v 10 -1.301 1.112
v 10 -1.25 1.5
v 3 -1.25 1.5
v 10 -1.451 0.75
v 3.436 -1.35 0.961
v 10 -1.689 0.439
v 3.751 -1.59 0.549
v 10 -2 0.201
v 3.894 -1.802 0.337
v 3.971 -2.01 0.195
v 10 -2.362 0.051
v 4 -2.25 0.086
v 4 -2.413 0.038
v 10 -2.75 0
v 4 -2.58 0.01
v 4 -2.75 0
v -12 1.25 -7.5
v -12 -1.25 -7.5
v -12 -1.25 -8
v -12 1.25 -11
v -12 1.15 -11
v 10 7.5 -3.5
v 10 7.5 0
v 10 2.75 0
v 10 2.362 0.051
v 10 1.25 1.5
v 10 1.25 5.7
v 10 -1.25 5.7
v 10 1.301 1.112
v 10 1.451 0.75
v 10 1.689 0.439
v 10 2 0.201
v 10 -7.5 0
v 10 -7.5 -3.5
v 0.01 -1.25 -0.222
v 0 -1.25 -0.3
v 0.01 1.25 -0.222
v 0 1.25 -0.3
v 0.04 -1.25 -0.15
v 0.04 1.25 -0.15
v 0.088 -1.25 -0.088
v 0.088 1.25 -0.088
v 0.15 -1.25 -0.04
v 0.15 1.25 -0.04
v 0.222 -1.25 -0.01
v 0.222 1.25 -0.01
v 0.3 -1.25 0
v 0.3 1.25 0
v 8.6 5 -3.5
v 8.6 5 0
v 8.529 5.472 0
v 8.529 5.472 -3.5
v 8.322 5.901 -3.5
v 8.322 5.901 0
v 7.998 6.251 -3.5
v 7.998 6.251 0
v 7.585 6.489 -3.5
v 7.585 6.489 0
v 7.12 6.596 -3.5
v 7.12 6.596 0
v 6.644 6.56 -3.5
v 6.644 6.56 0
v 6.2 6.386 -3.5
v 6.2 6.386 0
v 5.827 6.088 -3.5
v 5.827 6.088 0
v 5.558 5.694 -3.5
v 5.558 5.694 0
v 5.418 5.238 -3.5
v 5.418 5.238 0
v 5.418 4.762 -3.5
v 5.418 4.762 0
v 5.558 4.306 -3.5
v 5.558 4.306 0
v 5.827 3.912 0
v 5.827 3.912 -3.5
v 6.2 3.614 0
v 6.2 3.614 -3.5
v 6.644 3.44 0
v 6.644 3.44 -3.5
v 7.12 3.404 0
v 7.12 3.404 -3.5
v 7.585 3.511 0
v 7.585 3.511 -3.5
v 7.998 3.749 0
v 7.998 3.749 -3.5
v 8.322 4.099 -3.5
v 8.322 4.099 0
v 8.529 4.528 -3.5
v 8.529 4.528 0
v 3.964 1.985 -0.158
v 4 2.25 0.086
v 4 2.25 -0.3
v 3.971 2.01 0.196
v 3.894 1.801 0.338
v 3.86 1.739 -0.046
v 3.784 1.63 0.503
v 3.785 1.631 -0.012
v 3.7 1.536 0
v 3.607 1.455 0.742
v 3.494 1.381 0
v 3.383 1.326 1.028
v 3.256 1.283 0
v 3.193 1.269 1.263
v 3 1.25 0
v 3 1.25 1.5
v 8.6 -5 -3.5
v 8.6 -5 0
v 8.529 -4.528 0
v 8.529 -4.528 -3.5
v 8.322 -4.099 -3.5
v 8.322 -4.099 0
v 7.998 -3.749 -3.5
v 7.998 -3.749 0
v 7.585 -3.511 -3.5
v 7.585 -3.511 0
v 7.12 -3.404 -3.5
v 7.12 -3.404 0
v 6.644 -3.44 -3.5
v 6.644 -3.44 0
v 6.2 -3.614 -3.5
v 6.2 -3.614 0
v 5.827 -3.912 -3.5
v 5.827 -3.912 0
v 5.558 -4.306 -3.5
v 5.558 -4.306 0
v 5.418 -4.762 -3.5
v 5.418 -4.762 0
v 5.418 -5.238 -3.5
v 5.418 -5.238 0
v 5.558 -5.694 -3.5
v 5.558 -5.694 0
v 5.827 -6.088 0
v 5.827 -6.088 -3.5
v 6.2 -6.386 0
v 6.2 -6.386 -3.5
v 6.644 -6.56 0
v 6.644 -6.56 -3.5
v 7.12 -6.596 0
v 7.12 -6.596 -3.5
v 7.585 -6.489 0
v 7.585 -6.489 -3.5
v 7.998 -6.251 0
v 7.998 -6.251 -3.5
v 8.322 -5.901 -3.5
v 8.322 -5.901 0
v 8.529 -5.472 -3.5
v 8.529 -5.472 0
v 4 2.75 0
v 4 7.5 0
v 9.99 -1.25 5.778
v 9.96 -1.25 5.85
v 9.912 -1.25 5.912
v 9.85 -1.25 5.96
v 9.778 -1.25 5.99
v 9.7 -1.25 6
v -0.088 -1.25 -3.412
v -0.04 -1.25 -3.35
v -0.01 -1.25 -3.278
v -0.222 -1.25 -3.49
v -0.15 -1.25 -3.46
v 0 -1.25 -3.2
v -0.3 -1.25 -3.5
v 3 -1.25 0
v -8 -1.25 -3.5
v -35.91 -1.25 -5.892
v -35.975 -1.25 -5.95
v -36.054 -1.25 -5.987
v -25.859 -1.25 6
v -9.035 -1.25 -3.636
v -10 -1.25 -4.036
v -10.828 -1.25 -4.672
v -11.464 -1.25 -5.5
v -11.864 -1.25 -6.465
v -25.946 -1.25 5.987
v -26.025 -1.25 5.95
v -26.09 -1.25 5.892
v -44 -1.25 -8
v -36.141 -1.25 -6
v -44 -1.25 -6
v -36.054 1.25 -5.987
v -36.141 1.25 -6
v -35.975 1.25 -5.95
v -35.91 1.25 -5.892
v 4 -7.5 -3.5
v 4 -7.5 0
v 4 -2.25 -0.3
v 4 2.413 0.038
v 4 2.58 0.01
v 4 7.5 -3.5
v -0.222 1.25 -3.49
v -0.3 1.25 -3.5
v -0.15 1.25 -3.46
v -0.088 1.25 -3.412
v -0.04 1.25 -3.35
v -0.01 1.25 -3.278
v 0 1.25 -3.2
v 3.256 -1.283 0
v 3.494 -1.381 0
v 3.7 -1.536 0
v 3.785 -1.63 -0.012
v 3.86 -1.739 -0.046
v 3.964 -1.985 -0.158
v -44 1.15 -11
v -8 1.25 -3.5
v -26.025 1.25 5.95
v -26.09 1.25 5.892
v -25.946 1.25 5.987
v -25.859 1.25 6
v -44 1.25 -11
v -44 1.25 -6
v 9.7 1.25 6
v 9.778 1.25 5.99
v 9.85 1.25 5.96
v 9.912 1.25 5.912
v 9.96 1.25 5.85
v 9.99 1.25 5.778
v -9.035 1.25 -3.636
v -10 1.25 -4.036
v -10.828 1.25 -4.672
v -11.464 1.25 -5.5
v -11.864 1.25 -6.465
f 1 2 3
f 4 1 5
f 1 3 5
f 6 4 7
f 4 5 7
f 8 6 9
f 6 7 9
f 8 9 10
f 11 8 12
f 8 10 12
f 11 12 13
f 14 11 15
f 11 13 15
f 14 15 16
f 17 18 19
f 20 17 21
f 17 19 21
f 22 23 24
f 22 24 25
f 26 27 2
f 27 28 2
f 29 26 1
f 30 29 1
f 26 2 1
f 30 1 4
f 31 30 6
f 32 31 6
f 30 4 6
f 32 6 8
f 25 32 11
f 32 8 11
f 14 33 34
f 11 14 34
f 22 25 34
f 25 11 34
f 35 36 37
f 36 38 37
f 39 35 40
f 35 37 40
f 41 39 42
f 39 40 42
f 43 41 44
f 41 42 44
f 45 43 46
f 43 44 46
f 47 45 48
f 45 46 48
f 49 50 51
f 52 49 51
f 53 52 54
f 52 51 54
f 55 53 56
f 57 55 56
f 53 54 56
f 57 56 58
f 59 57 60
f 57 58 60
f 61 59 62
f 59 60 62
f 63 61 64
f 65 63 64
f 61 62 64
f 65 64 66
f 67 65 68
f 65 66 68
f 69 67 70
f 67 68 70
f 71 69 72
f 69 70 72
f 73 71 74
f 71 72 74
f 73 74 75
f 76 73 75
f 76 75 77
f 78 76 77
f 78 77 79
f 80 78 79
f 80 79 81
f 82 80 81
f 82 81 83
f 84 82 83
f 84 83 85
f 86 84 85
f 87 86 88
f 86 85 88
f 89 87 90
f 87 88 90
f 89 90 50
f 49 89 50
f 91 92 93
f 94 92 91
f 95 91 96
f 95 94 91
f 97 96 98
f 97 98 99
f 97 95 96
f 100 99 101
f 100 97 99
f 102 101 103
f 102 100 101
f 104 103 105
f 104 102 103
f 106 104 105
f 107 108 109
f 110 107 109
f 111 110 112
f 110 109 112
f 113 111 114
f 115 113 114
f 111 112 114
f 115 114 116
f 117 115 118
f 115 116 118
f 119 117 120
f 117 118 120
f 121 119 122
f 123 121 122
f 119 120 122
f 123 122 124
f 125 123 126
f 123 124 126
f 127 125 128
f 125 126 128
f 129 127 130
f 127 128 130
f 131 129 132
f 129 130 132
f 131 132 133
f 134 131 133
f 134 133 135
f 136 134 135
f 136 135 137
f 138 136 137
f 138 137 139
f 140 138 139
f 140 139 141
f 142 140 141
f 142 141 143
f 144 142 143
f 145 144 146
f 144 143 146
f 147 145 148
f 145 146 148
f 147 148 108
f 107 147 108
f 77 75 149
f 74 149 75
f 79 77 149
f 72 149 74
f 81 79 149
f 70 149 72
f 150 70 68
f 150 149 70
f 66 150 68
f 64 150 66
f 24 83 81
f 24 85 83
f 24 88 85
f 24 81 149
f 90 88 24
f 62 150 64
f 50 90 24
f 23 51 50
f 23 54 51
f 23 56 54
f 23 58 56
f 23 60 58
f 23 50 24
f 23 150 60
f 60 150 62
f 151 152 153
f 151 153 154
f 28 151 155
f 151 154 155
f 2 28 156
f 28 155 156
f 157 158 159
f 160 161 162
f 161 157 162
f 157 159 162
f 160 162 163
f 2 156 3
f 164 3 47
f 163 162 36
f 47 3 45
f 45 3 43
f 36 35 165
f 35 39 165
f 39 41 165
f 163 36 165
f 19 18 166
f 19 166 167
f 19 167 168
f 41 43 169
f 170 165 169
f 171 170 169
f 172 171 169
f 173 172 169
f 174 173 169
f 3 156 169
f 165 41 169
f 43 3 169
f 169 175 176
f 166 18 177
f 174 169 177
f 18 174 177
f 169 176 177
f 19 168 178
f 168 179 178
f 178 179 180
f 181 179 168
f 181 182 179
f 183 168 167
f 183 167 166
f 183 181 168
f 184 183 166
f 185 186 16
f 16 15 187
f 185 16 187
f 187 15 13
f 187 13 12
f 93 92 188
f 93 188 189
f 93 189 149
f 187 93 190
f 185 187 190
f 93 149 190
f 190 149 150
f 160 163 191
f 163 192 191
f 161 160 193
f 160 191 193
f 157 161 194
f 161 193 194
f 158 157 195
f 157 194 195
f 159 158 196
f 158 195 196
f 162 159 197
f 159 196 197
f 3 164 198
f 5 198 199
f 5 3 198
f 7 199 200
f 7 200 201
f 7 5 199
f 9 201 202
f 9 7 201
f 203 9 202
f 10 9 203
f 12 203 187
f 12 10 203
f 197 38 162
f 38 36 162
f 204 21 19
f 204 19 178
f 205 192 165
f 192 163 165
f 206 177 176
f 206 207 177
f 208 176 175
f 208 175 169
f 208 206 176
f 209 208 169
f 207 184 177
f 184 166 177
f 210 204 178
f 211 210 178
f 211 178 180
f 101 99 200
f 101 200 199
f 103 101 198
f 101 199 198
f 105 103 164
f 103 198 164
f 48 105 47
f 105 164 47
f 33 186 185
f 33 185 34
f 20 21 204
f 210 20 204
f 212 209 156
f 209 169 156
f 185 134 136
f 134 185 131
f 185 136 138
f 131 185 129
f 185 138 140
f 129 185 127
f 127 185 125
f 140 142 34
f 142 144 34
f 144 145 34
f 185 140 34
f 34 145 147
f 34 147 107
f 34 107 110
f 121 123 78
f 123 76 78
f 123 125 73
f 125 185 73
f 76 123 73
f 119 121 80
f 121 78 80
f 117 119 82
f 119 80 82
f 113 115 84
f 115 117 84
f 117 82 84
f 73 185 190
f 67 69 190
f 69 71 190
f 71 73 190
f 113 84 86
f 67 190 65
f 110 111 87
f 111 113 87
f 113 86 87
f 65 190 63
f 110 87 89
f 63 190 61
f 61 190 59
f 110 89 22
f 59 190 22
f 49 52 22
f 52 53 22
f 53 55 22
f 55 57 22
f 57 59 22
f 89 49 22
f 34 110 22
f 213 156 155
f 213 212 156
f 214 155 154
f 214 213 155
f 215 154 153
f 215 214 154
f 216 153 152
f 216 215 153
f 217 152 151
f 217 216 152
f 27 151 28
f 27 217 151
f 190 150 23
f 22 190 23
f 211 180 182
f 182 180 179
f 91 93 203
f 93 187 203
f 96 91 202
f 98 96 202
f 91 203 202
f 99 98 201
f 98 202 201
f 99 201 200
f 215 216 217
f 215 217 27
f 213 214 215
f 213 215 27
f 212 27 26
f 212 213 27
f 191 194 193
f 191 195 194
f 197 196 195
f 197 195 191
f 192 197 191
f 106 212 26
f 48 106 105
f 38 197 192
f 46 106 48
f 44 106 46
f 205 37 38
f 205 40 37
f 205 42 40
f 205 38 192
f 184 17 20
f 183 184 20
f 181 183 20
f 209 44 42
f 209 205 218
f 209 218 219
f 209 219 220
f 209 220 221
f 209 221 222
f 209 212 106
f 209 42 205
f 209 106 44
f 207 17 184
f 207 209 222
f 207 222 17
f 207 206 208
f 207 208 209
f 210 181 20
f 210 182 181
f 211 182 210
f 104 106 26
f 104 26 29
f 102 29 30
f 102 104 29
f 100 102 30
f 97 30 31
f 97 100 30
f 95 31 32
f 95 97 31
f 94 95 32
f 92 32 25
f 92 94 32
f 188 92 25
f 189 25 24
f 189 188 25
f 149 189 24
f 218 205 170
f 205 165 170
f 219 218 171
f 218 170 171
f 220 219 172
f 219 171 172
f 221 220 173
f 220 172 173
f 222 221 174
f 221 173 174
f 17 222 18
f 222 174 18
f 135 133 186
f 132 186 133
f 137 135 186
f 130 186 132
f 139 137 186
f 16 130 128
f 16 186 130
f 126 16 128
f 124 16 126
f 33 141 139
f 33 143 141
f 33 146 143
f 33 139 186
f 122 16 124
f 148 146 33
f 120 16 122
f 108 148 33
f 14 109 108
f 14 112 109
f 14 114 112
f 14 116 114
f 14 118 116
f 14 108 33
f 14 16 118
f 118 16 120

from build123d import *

# Parameters (mm, degrees)
SKETCH_W          = 6
SKETCH_H          = 15
SKETCH_R          = 1.6
PAD_DEPTH         = 3.5
PAD001_DEPTH      = 1.25
PAD001_DEPTH_BACK = 1.25
CHAMFER_SIZE2     = 2.4
CHAMFER_SIZE      = 3
FILLET_R          = 0.3
FILLET001_R       = 1.5
FILLET002_R       = 1
FILLET003_R       = 0.3


with BuildPart() as part:
    # Sketch (on XY_Plane of Origin) → Pad (new body)
    with BuildSketch(Plane.XY):
        with Locations((7, 0)):
            Rectangle(SKETCH_W, SKETCH_H)
        with Locations((7, 5)):
            Circle(SKETCH_R, mode=Mode.SUBTRACT)
        with Locations((7, -5)):
            Circle(SKETCH_R, mode=Mode.SUBTRACT)
    extrude(amount=-PAD_DEPTH)

    # Sketch003 → Pad001 (join, two sides)
    with BuildSketch(Plane.XZ) as pad001_sk:
        with BuildLine():
            Line((10, 0), (0, 0))
            Line((0, 0), (0, -3.5))
            Line((0, -3.5), (-8, -3.5))
            ThreePointArc((-8, -3.5), (-10.828427, -4.671573), (-12, -7.5))
            Line((-12, -7.5), (-12, -11))
            Line((-12, -11), (-44, -11))
            Line((-44, -11), (-44, -6))
            Line((-44, -6), (-36, -6))
            Line((-36, -6), (-26, 6))
            Line((-26, 6), (10, 6))
            Line((10, 6), (10, 0))
        make_face()
    extrude(amount=PAD001_DEPTH)
    extrude(pad001_sk.sketch, amount=-PAD001_DEPTH_BACK)

    # Chamfer
    chamfer_edges = [part.edges().sort_by_distance(p)[0] for p in [
        (-28, -1.25, -11),
    ]]
    chamfer_side = part.faces().sort_by_distance((-17.427573, -1.25, -2.073781))[0]
    chamfer(chamfer_edges, length=CHAMFER_SIZE, length2=CHAMFER_SIZE2, reference=chamfer_side)

    # Fillet
    fillet_edges = [part.edges().sort_by_distance(p)[0] for p in [
        (-36, 0, -6),
        (-26, 0, 6),
        (0, 0, -3.5),
        (10, 0, 6),
        (0, 0, 0),
    ]]
    fillet(fillet_edges, radius=FILLET_R)

    # Fillet001
    fillet001_edges = [part.edges().sort_by_distance(p)[0] for p in [
        (7, 1.25, 0),
        (7, -1.25, 0),
    ]]
    fillet(fillet001_edges, radius=FILLET001_R)

    # Fillet002
    fillet002_edges = [part.edges().sort_by_distance(p)[0] for p in [
        (4, 1.25, 0.75),
        (4, -1.25, 0.75),
    ]]
    fillet(fillet002_edges, radius=FILLET002_R)

    # Fillet003
    fillet003_edges = [part.edges().sort_by_distance(p)[0] for p in [
        (4, 0, 0),
    ]]
    fillet(fillet003_edges, radius=FILLET003_R)


solid = part.part
